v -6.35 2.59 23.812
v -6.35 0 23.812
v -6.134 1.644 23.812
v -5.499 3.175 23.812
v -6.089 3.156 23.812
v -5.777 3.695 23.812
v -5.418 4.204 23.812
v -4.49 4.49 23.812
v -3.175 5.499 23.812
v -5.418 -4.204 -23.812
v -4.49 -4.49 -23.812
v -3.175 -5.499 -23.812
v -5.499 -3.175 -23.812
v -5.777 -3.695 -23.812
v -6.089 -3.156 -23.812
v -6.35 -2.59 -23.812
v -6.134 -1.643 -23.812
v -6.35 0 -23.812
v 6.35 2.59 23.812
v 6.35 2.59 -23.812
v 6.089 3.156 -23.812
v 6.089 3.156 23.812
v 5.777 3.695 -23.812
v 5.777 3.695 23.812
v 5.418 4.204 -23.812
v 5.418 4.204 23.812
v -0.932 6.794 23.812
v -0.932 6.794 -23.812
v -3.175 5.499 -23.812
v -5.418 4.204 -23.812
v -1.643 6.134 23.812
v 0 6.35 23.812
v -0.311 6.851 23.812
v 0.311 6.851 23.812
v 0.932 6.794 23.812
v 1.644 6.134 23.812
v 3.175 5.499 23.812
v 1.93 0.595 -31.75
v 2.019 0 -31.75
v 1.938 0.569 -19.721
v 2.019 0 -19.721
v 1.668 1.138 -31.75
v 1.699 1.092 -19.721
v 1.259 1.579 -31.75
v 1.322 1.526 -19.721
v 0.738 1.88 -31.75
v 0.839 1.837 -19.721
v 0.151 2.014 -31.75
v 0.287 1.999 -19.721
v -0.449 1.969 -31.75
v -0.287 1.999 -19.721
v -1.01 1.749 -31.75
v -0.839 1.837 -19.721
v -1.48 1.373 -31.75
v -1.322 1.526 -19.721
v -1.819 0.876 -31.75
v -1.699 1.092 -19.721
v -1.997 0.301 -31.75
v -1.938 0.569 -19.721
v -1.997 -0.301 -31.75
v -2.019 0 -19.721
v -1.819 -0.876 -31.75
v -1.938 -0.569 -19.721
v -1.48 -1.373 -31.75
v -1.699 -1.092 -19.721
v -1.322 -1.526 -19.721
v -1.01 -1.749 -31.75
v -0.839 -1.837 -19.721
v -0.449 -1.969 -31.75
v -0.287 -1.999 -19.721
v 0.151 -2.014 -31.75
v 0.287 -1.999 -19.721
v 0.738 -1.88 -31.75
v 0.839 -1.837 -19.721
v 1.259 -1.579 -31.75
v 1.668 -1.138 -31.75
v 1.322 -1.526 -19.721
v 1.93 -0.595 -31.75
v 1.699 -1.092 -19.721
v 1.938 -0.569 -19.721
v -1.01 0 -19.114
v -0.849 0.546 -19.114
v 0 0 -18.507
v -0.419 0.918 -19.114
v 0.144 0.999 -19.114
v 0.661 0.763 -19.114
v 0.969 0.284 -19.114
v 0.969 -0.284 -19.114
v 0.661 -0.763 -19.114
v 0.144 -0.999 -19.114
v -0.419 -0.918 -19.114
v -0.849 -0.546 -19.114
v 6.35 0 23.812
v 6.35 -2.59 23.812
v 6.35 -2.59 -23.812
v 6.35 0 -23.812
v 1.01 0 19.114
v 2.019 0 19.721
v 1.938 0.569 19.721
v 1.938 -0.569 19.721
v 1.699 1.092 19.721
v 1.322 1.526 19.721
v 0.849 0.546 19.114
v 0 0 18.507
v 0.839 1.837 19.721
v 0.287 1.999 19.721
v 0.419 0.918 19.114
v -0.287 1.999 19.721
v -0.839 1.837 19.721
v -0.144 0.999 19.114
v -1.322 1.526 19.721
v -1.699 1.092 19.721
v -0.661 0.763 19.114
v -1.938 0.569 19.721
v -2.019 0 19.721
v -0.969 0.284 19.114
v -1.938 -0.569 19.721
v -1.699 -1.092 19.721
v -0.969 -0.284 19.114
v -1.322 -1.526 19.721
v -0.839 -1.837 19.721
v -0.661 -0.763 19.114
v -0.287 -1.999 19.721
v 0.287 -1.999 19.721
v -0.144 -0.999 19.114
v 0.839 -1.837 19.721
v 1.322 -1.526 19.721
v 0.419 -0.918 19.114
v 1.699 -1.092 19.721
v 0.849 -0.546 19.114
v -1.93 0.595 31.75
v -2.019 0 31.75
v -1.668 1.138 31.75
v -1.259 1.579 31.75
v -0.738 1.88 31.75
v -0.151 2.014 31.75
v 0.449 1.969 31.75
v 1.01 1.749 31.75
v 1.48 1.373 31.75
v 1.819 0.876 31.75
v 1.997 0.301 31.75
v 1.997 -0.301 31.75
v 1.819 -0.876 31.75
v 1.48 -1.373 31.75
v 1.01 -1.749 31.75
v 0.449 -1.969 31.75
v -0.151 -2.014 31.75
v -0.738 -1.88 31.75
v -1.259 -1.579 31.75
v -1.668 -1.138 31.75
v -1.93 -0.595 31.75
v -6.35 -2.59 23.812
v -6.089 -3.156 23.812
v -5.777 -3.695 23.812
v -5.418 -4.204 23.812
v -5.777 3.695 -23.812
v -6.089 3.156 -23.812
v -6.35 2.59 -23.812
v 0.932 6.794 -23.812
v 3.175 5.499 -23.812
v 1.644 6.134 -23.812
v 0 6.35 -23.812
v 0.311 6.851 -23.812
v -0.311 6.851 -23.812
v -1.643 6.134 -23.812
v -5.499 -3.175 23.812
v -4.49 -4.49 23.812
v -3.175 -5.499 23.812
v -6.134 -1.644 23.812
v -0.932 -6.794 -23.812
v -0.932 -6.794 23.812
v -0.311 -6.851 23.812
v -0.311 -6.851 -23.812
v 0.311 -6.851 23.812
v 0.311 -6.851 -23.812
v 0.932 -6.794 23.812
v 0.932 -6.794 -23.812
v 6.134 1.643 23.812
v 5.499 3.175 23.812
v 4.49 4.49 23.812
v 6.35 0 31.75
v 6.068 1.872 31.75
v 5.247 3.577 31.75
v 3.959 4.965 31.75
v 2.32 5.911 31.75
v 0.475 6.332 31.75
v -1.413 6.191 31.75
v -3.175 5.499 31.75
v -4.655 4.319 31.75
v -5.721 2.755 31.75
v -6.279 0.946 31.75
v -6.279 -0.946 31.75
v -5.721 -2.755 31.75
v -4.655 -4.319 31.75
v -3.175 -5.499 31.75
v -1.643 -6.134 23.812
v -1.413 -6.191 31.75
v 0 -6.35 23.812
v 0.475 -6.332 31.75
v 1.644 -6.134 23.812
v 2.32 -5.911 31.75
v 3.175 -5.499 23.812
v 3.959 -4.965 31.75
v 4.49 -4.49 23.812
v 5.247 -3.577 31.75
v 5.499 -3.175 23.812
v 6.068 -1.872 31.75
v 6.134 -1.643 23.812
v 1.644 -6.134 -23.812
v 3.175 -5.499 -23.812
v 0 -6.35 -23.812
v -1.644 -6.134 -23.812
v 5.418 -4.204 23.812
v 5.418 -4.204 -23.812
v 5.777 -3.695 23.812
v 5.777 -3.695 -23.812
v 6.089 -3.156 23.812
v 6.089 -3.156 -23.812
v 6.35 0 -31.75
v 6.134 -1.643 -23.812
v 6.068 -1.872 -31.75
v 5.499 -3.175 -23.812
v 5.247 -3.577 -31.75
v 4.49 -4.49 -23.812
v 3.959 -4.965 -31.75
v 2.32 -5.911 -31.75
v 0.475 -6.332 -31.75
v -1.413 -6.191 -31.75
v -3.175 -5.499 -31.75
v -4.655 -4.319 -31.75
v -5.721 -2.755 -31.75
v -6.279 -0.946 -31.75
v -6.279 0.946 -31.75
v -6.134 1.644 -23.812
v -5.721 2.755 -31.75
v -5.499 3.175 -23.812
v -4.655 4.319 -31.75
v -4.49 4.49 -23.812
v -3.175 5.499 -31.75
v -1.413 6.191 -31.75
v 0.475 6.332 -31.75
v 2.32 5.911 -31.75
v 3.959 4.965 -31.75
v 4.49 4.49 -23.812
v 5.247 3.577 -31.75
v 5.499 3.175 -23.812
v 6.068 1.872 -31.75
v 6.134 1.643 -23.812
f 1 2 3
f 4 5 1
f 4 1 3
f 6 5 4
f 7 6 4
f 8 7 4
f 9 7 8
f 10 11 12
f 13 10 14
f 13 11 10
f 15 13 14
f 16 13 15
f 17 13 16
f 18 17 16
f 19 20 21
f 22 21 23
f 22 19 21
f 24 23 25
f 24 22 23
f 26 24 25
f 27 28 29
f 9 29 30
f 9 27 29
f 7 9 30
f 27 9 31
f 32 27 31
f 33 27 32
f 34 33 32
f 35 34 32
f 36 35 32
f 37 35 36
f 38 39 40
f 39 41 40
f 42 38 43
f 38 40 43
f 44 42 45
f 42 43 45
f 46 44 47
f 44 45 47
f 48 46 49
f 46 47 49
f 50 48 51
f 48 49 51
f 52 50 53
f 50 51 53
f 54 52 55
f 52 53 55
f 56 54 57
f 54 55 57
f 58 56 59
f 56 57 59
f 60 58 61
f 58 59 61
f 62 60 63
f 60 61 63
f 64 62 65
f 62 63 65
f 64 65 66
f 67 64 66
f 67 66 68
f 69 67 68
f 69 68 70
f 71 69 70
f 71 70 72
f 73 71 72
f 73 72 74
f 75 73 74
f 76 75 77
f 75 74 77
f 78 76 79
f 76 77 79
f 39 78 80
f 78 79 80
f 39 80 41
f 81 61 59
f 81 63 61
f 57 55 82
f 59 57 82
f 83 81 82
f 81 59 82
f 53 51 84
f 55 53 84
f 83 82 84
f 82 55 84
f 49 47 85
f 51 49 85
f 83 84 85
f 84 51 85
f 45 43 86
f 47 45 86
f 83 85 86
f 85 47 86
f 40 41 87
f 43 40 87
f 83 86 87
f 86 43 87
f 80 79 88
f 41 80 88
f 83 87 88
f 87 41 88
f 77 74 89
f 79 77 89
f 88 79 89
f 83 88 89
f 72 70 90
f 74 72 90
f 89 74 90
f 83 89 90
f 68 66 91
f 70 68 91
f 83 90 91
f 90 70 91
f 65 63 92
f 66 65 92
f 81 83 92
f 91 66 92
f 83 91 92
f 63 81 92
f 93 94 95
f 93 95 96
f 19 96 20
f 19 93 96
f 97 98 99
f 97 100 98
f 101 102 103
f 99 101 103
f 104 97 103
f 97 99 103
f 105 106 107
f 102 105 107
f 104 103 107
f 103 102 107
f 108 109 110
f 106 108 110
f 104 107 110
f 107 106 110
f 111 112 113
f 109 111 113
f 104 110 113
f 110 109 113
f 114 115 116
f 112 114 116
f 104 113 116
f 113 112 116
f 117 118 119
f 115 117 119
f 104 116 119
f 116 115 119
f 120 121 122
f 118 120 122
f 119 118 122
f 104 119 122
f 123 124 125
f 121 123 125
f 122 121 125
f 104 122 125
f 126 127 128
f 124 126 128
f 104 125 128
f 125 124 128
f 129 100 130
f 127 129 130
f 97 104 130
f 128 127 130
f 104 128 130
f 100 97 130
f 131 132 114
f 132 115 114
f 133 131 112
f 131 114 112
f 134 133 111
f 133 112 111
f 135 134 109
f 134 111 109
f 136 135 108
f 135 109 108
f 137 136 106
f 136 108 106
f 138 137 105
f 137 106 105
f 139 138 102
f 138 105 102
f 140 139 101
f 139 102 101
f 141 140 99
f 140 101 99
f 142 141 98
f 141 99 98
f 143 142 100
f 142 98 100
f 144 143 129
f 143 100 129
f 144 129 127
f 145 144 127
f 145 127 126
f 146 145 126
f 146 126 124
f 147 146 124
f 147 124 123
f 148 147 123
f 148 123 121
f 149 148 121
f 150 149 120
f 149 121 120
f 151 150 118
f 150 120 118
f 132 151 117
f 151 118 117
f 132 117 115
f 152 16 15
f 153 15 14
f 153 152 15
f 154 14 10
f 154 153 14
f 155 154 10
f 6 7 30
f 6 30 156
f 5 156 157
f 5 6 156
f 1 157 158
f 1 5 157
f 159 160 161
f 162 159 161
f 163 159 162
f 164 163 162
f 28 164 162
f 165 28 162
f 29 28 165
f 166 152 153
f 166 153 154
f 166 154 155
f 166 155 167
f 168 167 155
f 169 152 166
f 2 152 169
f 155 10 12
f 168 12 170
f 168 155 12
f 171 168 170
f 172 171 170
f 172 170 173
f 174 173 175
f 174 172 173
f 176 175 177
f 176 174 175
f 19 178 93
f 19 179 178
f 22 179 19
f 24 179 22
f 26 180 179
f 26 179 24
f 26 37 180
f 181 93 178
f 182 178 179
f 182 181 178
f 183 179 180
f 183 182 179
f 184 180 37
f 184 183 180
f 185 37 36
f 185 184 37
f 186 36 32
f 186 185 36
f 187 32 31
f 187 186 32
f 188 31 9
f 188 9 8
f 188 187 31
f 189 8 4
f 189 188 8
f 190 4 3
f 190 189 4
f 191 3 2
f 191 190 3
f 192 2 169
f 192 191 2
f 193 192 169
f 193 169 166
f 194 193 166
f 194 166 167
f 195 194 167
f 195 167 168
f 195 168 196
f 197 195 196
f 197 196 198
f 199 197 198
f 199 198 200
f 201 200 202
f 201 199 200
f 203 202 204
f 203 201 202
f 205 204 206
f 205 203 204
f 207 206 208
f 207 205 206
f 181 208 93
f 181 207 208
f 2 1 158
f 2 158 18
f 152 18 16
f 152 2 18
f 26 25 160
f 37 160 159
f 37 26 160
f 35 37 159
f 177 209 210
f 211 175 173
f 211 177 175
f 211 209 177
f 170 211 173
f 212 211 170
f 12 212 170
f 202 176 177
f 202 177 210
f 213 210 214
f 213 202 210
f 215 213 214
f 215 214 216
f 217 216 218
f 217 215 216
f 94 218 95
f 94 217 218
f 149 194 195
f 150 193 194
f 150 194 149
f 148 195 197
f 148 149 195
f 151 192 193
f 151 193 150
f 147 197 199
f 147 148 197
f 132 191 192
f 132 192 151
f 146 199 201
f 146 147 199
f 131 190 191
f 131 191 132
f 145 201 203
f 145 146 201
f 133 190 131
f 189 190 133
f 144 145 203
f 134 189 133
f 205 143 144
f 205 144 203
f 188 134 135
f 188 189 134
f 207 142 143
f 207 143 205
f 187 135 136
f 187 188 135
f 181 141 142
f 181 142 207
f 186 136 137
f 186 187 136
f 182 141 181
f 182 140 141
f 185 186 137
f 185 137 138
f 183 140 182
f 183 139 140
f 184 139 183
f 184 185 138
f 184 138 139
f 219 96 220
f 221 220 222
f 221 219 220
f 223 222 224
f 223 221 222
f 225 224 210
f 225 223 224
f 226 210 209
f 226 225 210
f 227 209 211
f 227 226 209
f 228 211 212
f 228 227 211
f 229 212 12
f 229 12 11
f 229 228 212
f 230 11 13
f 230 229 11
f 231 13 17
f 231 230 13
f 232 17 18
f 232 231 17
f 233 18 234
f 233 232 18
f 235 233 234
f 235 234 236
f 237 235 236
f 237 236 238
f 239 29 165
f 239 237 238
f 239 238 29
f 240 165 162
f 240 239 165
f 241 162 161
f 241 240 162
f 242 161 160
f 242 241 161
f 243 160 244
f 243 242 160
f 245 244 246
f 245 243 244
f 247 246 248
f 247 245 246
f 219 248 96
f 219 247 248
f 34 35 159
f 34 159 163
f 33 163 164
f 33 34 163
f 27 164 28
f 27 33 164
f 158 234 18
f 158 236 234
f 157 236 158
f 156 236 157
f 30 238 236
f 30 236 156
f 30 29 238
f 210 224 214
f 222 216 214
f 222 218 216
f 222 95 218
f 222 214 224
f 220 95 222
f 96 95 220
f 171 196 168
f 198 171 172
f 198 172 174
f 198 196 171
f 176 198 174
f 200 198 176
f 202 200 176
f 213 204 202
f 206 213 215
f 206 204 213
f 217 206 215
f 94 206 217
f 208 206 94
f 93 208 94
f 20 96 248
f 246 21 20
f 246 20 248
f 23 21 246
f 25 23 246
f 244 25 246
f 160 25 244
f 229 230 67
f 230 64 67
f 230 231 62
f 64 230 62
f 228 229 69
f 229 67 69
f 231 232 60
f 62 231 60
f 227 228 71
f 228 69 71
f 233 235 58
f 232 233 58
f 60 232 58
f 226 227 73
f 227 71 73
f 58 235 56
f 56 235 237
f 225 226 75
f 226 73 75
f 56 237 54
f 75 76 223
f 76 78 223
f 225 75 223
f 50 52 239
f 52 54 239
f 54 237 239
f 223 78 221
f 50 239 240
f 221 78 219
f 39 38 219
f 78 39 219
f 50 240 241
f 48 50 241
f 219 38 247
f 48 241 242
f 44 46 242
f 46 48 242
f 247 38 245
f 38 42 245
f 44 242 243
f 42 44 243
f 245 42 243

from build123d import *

# Parameters (mm, degrees)
BOSS_EXTRUDE1_DEPTH                  = 31.75
CUT_EXTRUDE1_START                   = 31.75
SKETCH2_OUTSIDE_W                    = 27.938
SKETCH2_OUTSIDE_H                    = 28.954
SKETCH2_OUTSIDE_R                    = 6.35
CUT_EXTRUDE1_DEPTH                   = 7.9375
SKETCH5_OUTSIDE_W                    = 27.938
SKETCH5_OUTSIDE_H                    = 28.954
SKETCH5_OUTSIDE_R                    = 6.35
CUT_EXTRUDE5_DEPTH                   = 7.9375
F_10_32_TAPPED_HOLE1_D               = 4.0386
F_10_32_TAPPED_HOLE1_DEPTH           = 12.02944
F_10_32_TAPPED_HOLE1_TIP             = 1.213317848
F_10_32_TAPPED_HOLE1_ON_FACE_2_D     = 4.0386
F_10_32_TAPPED_HOLE1_ON_FACE_2_DEPTH = 12.02944
F_10_32_TAPPED_HOLE1_ON_FACE_2_TIP   = 1.213317848


with BuildPart() as part:
    # Sketch1 → Boss-Extrude1 (new, symmetric)
    with BuildSketch(Plane.XY):
        with BuildLine():
            ThreePointArc((0.93173274, 6.79441227), (0, 6.858), (-0.93173274, 6.79441227))
            Line((-0.93173274, 6.79441227), (-5.41826726, 4.204110358))
            ThreePointArc((-5.41826726, 4.204110358), (-5.939202219, 3.429), (-6.35, 2.590301913))
            Line((-6.35, 2.590301913), (-6.35, -2.590301913))
            ThreePointArc((-6.35, -2.590301913), (-5.939202219, -3.429), (-5.41826726, -4.204110358))
            Line((-5.41826726, -4.204110358), (-0.93173274, -6.79441227))
            ThreePointArc((-0.93173274, -6.79441227), (0, -6.858), (0.93173274, -6.79441227))
            Line((0.93173274, -6.79441227), (5.41826726, -4.204110358))
            ThreePointArc((5.41826726, -4.204110358), (5.939202219, -3.429), (6.35, -2.590301913))
            Line((6.35, -2.590301913), (6.35, 2.590301913))
            ThreePointArc((6.35, 2.590301913), (5.939202219, 3.429), (5.41826726, 4.204110358))
            Line((5.41826726, 4.204110358), (0.93173274, 6.79441227))
        make_face()
    extrude(amount=BOSS_EXTRUDE1_DEPTH, both=True)

    # Sketch2 outside → Cut-Extrude1 (cut)
    with BuildSketch(Plane.XY.offset(CUT_EXTRUDE1_START)):
        Rectangle(SKETCH2_OUTSIDE_W, SKETCH2_OUTSIDE_H)
        Circle(SKETCH2_OUTSIDE_R, mode=Mode.SUBTRACT)
    extrude(amount=-CUT_EXTRUDE1_DEPTH, mode=Mode.SUBTRACT)

    # Sketch5 outside → Cut-Extrude5 (cut)
    with BuildSketch(Plane(origin=(0, 0, -31.75), x_dir=(-1, 0, 0), z_dir=(0, 0, -1))):
        Rectangle(SKETCH5_OUTSIDE_W, SKETCH5_OUTSIDE_H)
        with Locations(Location((0, 0, 0), (0, 0, 180))):
            Circle(SKETCH5_OUTSIDE_R, mode=Mode.SUBTRACT)
    extrude(amount=-CUT_EXTRUDE5_DEPTH, mode=Mode.SUBTRACT)

    # #10-32 Tapped Hole1
    with Locations(Plane(origin=(0, 0, -31.75), x_dir=(-1, 0, 0), z_dir=(0, 0, -1))):
        with Locations((0, 0)):
            Hole(F_10_32_TAPPED_HOLE1_D / 2, depth=F_10_32_TAPPED_HOLE1_DEPTH)
            with Locations((0, 0, -(F_10_32_TAPPED_HOLE1_DEPTH + F_10_32_TAPPED_HOLE1_TIP / 2))):  # 118° drill point
                Cone(0, F_10_32_TAPPED_HOLE1_D / 2, F_10_32_TAPPED_HOLE1_TIP, mode=Mode.SUBTRACT)

    # #10-32 Tapped Hole1 on face 2
    with Locations(Plane.XY.offset(31.75)):
        with Locations((0, 0)):
            Hole(F_10_32_TAPPED_HOLE1_ON_FACE_2_D / 2, depth=F_10_32_TAPPED_HOLE1_ON_FACE_2_DEPTH)
            with Locations((0, 0, -(F_10_32_TAPPED_HOLE1_ON_FACE_2_DEPTH + F_10_32_TAPPED_HOLE1_ON_FACE_2_TIP / 2))):  # 118° drill point
                Cone(0, F_10_32_TAPPED_HOLE1_ON_FACE_2_D / 2, F_10_32_TAPPED_HOLE1_ON_FACE_2_TIP, mode=Mode.SUBTRACT)


solid = part.part
